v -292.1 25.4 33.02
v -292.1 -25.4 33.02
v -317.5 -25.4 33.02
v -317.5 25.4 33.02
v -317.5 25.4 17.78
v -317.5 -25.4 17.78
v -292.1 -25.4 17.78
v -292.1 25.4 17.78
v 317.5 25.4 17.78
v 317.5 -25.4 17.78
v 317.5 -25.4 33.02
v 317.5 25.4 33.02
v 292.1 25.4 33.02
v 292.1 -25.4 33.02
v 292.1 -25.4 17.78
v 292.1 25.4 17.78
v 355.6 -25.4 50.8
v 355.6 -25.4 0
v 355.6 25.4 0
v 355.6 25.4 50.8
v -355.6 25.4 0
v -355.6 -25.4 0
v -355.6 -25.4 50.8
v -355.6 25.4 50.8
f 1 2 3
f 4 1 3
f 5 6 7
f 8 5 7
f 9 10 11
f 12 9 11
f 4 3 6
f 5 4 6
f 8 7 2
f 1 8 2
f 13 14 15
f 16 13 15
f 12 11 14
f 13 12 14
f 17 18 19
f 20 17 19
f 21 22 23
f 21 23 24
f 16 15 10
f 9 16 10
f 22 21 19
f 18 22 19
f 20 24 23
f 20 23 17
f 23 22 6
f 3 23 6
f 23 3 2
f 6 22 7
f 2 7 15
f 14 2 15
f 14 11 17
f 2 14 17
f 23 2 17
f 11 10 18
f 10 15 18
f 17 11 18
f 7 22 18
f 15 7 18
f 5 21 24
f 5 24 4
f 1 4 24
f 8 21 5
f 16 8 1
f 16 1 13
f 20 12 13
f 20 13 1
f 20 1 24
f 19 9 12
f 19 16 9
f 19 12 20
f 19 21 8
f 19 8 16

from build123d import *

# Parameters (mm, degrees)
F0_W     = 711.2
F0_H     = 50.8
F1_DEPTH = 50.8
F3_DEPTH = 50.8
F5_DEPTH = 50.8


with BuildPart() as f1:
    # F0 (on Top) → F1 (new body)
    with BuildSketch(Plane.XY):
        Rectangle(F0_W, F0_H)
    extrude(amount=F1_DEPTH)

    # F2 (on face) → F3 (cut)
    with BuildSketch(Plane.XZ.offset(25.4)):
        Polygon((-292.1, 33.02), (-317.5, 33.02), (-317.5, 25.4), (-317.5, 17.78), (-292.1, 17.78), align=None)
    extrude(amount=-F3_DEPTH, mode=Mode.SUBTRACT)

    # F4 (on face) → F5 (cut)
    with BuildSketch(Plane.XZ.offset(25.4)):
        Polygon((317.5, 25.4), (317.5, 33.02), (292.1, 33.02), (292.1, 17.78), (317.5, 17.78), align=None)
    extrude(amount=-F5_DEPTH, mode=Mode.SUBTRACT)


solid = f1.part
